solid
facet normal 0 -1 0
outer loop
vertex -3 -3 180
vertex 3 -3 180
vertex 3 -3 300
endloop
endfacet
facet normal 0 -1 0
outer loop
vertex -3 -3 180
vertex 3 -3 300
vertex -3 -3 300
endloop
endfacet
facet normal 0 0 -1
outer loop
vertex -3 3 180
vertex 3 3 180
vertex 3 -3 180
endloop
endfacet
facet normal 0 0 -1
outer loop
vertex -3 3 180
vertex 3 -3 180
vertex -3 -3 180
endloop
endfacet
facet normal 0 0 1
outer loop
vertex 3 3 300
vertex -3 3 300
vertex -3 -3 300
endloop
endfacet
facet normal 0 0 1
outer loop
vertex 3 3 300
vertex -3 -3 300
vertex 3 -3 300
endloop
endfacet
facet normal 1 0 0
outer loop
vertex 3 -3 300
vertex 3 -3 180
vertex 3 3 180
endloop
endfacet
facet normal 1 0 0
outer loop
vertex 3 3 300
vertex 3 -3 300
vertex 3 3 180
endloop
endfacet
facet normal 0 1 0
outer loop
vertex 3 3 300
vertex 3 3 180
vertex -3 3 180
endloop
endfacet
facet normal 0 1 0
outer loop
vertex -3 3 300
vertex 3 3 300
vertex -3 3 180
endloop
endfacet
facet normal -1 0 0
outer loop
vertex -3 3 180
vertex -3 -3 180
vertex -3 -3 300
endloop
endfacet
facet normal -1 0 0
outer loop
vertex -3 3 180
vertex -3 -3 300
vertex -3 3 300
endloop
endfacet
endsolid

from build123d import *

# Parameters (mm, degrees)
SKETCH_1_W            = 10
SKETCH_1_H            = 10
EXTRUDE_1_DEPTH       = 300
SKETCH_2_W            = 10
SKETCH_2_H            = 10
CUT_EXTRUDE_1_DEPTH   = 100
SKETCH_3_W            = 26
SKETCH_3_H            = 26
SKETCH_3_W_2          = 6
SKETCH_3_H_2          = 6
CUT_EXTRUDE_1_2_DEPTH = 201.124960962
SKETCH_4_W            = 6.990090154
SKETCH_4_H            = 6.654359222
CUT_EXTRUDE_2_DEPTH   = 80


with BuildPart() as part:
    # 草图1 → 凸台-拉伸1 (new body)
    with BuildSketch(Plane.XY):
        Rectangle(SKETCH_1_W, SKETCH_1_H)
    extrude(amount=EXTRUDE_1_DEPTH)

    # 草图2 → Cut-Extrude 1 (cut)
    with BuildSketch(Plane(origin=(0, 0, 0), x_dir=(-1, 0, 0), z_dir=(0, 0, -1))):
        Rectangle(SKETCH_2_W, SKETCH_2_H)
    extrude(amount=-CUT_EXTRUDE_1_DEPTH, mode=Mode.SUBTRACT)

    # 草图3 → Cut-Extrude 1 2 (cut, through all)
    with BuildSketch(Plane(origin=(0, 0, 100), x_dir=(-1, 0, 0), z_dir=(0, 0, -1))):
        Rectangle(SKETCH_3_W, SKETCH_3_H)
        Rectangle(SKETCH_3_W_2, SKETCH_3_H_2, mode=Mode.SUBTRACT)
    extrude(amount=-CUT_EXTRUDE_1_2_DEPTH, mode=Mode.SUBTRACT)

    # 草图4 → 切除-拉伸2 (cut)
    with BuildSketch(Plane(origin=(0, 0, 100), x_dir=(-1, 0, 0), z_dir=(0, 0, -1))):
        Rectangle(SKETCH_4_W, SKETCH_4_H)
    extrude(amount=-CUT_EXTRUDE_2_DEPTH, mode=Mode.SUBTRACT)


solid = part.part
